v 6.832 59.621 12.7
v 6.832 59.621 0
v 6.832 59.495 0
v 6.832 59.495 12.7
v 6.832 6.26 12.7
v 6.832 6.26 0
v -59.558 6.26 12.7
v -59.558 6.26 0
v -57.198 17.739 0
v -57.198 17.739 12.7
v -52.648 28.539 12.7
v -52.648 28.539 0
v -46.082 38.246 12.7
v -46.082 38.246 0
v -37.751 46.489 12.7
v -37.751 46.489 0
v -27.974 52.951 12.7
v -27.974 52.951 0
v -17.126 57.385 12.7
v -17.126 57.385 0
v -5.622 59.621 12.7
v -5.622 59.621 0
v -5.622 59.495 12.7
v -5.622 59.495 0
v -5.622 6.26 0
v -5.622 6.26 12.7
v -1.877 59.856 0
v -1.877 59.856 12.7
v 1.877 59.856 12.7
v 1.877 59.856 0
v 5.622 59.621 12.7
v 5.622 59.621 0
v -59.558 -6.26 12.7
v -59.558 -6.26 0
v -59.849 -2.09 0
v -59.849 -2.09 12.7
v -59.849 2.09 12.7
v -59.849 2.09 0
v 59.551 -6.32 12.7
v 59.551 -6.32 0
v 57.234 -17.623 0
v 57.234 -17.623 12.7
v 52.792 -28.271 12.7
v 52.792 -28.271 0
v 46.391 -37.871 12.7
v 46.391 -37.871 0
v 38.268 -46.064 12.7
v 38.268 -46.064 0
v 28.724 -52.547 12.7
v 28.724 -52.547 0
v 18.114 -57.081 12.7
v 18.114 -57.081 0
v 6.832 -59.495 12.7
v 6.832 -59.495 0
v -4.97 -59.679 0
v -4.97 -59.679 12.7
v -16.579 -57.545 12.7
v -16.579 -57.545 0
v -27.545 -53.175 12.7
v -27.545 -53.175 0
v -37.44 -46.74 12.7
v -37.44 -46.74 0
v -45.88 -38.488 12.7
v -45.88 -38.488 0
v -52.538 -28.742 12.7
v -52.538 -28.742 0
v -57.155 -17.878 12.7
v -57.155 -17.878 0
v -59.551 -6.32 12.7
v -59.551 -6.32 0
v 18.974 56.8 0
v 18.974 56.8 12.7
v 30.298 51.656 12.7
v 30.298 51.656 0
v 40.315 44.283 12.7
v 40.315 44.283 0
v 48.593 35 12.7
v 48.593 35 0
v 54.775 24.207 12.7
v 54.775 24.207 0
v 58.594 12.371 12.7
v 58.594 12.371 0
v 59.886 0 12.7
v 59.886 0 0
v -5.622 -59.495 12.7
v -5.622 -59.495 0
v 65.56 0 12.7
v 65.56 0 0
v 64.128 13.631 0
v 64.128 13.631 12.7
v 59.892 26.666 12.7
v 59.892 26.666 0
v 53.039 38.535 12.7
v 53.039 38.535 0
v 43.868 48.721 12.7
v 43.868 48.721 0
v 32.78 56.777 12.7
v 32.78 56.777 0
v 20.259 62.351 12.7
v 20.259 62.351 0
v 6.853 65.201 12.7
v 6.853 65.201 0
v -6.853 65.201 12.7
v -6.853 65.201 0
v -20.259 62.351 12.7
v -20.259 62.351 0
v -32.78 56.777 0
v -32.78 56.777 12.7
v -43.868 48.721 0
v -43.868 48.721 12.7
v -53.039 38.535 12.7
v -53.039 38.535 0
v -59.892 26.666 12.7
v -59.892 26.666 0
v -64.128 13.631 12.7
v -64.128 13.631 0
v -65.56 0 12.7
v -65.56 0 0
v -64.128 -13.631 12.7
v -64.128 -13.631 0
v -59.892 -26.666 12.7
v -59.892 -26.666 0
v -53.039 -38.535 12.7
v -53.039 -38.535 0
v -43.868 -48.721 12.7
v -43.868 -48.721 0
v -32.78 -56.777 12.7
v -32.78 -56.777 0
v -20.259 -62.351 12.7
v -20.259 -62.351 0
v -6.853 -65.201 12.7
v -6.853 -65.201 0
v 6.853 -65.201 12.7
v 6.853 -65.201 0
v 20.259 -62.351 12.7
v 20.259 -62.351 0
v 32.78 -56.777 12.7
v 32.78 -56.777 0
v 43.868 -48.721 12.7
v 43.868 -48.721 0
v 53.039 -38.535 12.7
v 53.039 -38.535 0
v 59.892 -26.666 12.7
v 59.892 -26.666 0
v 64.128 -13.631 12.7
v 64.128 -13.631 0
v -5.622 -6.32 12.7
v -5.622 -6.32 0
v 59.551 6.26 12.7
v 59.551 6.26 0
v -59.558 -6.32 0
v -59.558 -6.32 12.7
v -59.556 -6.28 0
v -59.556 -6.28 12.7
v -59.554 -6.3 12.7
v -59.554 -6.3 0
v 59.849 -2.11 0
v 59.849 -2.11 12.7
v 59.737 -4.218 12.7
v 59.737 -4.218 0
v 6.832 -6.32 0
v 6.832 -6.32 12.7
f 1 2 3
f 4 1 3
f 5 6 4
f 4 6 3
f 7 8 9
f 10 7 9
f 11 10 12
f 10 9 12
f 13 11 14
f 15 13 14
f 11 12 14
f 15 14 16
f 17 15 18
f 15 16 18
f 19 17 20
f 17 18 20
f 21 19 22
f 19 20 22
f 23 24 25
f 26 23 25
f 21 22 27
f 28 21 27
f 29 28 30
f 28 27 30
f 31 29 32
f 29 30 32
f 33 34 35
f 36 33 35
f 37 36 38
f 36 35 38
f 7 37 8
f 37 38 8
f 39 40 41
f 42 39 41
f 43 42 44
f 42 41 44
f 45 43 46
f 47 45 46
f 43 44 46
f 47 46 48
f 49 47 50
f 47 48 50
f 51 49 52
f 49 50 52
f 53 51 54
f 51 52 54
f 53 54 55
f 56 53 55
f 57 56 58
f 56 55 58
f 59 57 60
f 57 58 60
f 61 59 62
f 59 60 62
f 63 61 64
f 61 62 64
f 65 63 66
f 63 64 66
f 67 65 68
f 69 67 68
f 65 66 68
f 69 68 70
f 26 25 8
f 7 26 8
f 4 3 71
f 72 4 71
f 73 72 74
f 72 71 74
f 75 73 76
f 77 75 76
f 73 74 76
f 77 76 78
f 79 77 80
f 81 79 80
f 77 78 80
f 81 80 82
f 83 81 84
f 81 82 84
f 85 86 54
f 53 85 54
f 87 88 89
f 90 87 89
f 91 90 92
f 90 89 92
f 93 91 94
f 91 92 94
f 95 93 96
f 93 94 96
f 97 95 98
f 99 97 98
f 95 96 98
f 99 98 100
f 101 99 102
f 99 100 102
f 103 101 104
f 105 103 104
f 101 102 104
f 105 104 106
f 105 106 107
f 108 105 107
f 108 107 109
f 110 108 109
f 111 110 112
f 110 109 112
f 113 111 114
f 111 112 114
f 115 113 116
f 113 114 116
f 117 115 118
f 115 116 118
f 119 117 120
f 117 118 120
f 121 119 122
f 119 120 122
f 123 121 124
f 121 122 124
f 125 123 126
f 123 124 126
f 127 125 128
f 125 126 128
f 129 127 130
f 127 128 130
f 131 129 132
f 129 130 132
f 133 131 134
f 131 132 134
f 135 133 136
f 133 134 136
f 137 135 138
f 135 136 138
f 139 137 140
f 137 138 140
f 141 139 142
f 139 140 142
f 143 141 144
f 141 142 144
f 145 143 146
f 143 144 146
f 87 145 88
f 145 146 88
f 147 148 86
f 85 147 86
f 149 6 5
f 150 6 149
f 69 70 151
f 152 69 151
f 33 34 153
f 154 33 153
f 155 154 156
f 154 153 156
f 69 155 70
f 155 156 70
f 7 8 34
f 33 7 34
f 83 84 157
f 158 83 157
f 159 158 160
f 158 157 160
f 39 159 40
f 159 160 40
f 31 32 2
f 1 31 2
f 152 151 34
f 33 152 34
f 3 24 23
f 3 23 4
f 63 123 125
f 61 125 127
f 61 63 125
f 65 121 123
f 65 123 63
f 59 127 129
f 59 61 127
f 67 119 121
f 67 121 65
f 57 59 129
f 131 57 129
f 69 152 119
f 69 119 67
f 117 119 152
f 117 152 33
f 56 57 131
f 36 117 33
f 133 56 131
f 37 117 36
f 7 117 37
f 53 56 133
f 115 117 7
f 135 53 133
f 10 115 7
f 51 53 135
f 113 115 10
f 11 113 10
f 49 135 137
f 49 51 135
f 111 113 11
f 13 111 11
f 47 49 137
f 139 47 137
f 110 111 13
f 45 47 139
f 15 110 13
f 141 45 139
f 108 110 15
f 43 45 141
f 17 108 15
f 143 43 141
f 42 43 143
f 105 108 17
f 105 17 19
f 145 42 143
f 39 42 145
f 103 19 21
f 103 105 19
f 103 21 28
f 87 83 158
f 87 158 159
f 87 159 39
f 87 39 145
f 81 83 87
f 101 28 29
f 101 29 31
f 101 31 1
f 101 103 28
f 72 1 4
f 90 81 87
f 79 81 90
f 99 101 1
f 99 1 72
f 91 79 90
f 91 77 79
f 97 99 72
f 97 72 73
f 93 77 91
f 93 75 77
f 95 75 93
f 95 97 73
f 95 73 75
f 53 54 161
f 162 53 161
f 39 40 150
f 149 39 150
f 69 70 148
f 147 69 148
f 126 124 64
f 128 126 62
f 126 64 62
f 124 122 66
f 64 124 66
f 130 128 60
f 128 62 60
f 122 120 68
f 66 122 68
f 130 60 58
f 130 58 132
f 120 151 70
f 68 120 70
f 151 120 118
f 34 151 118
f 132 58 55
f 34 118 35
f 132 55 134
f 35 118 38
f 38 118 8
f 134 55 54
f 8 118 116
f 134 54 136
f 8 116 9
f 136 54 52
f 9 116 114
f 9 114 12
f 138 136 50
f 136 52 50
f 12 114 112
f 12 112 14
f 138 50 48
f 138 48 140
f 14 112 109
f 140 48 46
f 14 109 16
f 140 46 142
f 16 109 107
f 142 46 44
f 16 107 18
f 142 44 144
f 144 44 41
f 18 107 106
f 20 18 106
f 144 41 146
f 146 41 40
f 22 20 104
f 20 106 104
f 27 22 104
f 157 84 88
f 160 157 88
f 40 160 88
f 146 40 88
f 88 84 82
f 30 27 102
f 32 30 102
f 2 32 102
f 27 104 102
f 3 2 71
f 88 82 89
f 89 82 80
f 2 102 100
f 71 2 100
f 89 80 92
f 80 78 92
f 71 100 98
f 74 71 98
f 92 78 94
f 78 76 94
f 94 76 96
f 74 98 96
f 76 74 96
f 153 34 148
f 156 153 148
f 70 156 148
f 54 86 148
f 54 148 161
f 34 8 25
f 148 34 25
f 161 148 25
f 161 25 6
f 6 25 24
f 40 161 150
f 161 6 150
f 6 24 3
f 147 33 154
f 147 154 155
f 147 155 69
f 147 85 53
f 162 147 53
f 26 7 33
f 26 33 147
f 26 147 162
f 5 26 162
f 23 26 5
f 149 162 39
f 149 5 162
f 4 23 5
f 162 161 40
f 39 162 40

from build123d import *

# Parameters (mm, degrees)
F0_R     = 65.5602022546
F1_DEPTH = 12.7
F0_W     = 12.4544380459
F0_H     = 53.2347456641
F0_W_2   = 52.7194491877
F0_H_2   = 12.5804708937
F0_H_3   = 53.1745559146


with BuildPart() as f1:
    # F0 (on Top) → F1 (new body)
    with BuildSketch(Plane.XY):
        Circle(F0_R)
        with BuildLine():
            ThreePointArc((6.8319624097, 59.4948862362), (44.6959461159, 39.8571147906), (59.8858681045, 0))
            ThreePointArc((59.8858681045, 0), (59.802195524, -3.1645867238), (59.5514115975, -6.3203303216))
            ThreePointArc((59.5514115975, -6.3203303216), (42.5273022343, -42.1633224889), (6.8319624097, -59.4948862362))
            ThreePointArc((6.8319624097, -59.4948862362), (-37.4395303101, -46.7396915777), (-59.5514115975, -6.3203303216))
            Line((-59.5514115975, -6.3203303216), (-59.5577689193, -6.3203303216))
            Line((-59.5577689193, -6.3203303216), (-59.5577689193, -6.2601405721))
            ThreePointArc((-59.5577689193, -6.2601405721), (-59.8858681045, 0), (-59.5577689193, 6.2601405721))
            ThreePointArc((-59.5577689193, 6.2601405721), (-42.1185309141, 42.5716637244), (-5.6224756362, 59.621346566))
            ThreePointArc((-5.6224756362, 59.621346566), (0, 59.8858681045), (5.6224756362, 59.621346566))
            Line((5.6224756362, 59.621346566), (6.8319624097, 59.621346566))
            Line((6.8319624097, 59.621346566), (6.8319624097, 59.4948862362))
        make_face(mode=Mode.SUBTRACT)
    extrude(amount=F1_DEPTH)


with BuildPart() as f1b:
    # F0 (on Top) → F1, piece 2 (new body)
    with BuildSketch(Plane.XY):
        with Locations((0.6047433868, 32.8775134042)):
            Rectangle(F0_W, F0_H)
        with Locations((33.1916870036, -0.0300948747)):
            Rectangle(F0_W_2, F0_H_2)
        with Locations((0.6047433868, -0.0300948747)):
            Rectangle(F0_W, F0_H_2)
        with Locations((0.6047433868, -32.9076082789)):
            Rectangle(F0_W, F0_H_3)
        with BuildLine():
            Line((-5.6224756362, -6.3203303216), (-5.6224756362, 6.2601405721))
            Line((-5.6224756362, 6.2601405721), (-59.5577689193, 6.2601405721))
            Line((-59.5577689193, 6.2601405721), (-59.5577689193, -6.2601405721))
            ThreePointArc((-59.5577689193, -6.2601405721), (-59.5545978624, -6.29023625), (-59.5514115975, -6.3203303216))
            Line((-59.5514115975, -6.3203303216), (-5.6224756362, -6.3203303216))
        make_face()
    extrude(amount=F1_DEPTH)


solid = Compound([f1.part, f1b.part])
